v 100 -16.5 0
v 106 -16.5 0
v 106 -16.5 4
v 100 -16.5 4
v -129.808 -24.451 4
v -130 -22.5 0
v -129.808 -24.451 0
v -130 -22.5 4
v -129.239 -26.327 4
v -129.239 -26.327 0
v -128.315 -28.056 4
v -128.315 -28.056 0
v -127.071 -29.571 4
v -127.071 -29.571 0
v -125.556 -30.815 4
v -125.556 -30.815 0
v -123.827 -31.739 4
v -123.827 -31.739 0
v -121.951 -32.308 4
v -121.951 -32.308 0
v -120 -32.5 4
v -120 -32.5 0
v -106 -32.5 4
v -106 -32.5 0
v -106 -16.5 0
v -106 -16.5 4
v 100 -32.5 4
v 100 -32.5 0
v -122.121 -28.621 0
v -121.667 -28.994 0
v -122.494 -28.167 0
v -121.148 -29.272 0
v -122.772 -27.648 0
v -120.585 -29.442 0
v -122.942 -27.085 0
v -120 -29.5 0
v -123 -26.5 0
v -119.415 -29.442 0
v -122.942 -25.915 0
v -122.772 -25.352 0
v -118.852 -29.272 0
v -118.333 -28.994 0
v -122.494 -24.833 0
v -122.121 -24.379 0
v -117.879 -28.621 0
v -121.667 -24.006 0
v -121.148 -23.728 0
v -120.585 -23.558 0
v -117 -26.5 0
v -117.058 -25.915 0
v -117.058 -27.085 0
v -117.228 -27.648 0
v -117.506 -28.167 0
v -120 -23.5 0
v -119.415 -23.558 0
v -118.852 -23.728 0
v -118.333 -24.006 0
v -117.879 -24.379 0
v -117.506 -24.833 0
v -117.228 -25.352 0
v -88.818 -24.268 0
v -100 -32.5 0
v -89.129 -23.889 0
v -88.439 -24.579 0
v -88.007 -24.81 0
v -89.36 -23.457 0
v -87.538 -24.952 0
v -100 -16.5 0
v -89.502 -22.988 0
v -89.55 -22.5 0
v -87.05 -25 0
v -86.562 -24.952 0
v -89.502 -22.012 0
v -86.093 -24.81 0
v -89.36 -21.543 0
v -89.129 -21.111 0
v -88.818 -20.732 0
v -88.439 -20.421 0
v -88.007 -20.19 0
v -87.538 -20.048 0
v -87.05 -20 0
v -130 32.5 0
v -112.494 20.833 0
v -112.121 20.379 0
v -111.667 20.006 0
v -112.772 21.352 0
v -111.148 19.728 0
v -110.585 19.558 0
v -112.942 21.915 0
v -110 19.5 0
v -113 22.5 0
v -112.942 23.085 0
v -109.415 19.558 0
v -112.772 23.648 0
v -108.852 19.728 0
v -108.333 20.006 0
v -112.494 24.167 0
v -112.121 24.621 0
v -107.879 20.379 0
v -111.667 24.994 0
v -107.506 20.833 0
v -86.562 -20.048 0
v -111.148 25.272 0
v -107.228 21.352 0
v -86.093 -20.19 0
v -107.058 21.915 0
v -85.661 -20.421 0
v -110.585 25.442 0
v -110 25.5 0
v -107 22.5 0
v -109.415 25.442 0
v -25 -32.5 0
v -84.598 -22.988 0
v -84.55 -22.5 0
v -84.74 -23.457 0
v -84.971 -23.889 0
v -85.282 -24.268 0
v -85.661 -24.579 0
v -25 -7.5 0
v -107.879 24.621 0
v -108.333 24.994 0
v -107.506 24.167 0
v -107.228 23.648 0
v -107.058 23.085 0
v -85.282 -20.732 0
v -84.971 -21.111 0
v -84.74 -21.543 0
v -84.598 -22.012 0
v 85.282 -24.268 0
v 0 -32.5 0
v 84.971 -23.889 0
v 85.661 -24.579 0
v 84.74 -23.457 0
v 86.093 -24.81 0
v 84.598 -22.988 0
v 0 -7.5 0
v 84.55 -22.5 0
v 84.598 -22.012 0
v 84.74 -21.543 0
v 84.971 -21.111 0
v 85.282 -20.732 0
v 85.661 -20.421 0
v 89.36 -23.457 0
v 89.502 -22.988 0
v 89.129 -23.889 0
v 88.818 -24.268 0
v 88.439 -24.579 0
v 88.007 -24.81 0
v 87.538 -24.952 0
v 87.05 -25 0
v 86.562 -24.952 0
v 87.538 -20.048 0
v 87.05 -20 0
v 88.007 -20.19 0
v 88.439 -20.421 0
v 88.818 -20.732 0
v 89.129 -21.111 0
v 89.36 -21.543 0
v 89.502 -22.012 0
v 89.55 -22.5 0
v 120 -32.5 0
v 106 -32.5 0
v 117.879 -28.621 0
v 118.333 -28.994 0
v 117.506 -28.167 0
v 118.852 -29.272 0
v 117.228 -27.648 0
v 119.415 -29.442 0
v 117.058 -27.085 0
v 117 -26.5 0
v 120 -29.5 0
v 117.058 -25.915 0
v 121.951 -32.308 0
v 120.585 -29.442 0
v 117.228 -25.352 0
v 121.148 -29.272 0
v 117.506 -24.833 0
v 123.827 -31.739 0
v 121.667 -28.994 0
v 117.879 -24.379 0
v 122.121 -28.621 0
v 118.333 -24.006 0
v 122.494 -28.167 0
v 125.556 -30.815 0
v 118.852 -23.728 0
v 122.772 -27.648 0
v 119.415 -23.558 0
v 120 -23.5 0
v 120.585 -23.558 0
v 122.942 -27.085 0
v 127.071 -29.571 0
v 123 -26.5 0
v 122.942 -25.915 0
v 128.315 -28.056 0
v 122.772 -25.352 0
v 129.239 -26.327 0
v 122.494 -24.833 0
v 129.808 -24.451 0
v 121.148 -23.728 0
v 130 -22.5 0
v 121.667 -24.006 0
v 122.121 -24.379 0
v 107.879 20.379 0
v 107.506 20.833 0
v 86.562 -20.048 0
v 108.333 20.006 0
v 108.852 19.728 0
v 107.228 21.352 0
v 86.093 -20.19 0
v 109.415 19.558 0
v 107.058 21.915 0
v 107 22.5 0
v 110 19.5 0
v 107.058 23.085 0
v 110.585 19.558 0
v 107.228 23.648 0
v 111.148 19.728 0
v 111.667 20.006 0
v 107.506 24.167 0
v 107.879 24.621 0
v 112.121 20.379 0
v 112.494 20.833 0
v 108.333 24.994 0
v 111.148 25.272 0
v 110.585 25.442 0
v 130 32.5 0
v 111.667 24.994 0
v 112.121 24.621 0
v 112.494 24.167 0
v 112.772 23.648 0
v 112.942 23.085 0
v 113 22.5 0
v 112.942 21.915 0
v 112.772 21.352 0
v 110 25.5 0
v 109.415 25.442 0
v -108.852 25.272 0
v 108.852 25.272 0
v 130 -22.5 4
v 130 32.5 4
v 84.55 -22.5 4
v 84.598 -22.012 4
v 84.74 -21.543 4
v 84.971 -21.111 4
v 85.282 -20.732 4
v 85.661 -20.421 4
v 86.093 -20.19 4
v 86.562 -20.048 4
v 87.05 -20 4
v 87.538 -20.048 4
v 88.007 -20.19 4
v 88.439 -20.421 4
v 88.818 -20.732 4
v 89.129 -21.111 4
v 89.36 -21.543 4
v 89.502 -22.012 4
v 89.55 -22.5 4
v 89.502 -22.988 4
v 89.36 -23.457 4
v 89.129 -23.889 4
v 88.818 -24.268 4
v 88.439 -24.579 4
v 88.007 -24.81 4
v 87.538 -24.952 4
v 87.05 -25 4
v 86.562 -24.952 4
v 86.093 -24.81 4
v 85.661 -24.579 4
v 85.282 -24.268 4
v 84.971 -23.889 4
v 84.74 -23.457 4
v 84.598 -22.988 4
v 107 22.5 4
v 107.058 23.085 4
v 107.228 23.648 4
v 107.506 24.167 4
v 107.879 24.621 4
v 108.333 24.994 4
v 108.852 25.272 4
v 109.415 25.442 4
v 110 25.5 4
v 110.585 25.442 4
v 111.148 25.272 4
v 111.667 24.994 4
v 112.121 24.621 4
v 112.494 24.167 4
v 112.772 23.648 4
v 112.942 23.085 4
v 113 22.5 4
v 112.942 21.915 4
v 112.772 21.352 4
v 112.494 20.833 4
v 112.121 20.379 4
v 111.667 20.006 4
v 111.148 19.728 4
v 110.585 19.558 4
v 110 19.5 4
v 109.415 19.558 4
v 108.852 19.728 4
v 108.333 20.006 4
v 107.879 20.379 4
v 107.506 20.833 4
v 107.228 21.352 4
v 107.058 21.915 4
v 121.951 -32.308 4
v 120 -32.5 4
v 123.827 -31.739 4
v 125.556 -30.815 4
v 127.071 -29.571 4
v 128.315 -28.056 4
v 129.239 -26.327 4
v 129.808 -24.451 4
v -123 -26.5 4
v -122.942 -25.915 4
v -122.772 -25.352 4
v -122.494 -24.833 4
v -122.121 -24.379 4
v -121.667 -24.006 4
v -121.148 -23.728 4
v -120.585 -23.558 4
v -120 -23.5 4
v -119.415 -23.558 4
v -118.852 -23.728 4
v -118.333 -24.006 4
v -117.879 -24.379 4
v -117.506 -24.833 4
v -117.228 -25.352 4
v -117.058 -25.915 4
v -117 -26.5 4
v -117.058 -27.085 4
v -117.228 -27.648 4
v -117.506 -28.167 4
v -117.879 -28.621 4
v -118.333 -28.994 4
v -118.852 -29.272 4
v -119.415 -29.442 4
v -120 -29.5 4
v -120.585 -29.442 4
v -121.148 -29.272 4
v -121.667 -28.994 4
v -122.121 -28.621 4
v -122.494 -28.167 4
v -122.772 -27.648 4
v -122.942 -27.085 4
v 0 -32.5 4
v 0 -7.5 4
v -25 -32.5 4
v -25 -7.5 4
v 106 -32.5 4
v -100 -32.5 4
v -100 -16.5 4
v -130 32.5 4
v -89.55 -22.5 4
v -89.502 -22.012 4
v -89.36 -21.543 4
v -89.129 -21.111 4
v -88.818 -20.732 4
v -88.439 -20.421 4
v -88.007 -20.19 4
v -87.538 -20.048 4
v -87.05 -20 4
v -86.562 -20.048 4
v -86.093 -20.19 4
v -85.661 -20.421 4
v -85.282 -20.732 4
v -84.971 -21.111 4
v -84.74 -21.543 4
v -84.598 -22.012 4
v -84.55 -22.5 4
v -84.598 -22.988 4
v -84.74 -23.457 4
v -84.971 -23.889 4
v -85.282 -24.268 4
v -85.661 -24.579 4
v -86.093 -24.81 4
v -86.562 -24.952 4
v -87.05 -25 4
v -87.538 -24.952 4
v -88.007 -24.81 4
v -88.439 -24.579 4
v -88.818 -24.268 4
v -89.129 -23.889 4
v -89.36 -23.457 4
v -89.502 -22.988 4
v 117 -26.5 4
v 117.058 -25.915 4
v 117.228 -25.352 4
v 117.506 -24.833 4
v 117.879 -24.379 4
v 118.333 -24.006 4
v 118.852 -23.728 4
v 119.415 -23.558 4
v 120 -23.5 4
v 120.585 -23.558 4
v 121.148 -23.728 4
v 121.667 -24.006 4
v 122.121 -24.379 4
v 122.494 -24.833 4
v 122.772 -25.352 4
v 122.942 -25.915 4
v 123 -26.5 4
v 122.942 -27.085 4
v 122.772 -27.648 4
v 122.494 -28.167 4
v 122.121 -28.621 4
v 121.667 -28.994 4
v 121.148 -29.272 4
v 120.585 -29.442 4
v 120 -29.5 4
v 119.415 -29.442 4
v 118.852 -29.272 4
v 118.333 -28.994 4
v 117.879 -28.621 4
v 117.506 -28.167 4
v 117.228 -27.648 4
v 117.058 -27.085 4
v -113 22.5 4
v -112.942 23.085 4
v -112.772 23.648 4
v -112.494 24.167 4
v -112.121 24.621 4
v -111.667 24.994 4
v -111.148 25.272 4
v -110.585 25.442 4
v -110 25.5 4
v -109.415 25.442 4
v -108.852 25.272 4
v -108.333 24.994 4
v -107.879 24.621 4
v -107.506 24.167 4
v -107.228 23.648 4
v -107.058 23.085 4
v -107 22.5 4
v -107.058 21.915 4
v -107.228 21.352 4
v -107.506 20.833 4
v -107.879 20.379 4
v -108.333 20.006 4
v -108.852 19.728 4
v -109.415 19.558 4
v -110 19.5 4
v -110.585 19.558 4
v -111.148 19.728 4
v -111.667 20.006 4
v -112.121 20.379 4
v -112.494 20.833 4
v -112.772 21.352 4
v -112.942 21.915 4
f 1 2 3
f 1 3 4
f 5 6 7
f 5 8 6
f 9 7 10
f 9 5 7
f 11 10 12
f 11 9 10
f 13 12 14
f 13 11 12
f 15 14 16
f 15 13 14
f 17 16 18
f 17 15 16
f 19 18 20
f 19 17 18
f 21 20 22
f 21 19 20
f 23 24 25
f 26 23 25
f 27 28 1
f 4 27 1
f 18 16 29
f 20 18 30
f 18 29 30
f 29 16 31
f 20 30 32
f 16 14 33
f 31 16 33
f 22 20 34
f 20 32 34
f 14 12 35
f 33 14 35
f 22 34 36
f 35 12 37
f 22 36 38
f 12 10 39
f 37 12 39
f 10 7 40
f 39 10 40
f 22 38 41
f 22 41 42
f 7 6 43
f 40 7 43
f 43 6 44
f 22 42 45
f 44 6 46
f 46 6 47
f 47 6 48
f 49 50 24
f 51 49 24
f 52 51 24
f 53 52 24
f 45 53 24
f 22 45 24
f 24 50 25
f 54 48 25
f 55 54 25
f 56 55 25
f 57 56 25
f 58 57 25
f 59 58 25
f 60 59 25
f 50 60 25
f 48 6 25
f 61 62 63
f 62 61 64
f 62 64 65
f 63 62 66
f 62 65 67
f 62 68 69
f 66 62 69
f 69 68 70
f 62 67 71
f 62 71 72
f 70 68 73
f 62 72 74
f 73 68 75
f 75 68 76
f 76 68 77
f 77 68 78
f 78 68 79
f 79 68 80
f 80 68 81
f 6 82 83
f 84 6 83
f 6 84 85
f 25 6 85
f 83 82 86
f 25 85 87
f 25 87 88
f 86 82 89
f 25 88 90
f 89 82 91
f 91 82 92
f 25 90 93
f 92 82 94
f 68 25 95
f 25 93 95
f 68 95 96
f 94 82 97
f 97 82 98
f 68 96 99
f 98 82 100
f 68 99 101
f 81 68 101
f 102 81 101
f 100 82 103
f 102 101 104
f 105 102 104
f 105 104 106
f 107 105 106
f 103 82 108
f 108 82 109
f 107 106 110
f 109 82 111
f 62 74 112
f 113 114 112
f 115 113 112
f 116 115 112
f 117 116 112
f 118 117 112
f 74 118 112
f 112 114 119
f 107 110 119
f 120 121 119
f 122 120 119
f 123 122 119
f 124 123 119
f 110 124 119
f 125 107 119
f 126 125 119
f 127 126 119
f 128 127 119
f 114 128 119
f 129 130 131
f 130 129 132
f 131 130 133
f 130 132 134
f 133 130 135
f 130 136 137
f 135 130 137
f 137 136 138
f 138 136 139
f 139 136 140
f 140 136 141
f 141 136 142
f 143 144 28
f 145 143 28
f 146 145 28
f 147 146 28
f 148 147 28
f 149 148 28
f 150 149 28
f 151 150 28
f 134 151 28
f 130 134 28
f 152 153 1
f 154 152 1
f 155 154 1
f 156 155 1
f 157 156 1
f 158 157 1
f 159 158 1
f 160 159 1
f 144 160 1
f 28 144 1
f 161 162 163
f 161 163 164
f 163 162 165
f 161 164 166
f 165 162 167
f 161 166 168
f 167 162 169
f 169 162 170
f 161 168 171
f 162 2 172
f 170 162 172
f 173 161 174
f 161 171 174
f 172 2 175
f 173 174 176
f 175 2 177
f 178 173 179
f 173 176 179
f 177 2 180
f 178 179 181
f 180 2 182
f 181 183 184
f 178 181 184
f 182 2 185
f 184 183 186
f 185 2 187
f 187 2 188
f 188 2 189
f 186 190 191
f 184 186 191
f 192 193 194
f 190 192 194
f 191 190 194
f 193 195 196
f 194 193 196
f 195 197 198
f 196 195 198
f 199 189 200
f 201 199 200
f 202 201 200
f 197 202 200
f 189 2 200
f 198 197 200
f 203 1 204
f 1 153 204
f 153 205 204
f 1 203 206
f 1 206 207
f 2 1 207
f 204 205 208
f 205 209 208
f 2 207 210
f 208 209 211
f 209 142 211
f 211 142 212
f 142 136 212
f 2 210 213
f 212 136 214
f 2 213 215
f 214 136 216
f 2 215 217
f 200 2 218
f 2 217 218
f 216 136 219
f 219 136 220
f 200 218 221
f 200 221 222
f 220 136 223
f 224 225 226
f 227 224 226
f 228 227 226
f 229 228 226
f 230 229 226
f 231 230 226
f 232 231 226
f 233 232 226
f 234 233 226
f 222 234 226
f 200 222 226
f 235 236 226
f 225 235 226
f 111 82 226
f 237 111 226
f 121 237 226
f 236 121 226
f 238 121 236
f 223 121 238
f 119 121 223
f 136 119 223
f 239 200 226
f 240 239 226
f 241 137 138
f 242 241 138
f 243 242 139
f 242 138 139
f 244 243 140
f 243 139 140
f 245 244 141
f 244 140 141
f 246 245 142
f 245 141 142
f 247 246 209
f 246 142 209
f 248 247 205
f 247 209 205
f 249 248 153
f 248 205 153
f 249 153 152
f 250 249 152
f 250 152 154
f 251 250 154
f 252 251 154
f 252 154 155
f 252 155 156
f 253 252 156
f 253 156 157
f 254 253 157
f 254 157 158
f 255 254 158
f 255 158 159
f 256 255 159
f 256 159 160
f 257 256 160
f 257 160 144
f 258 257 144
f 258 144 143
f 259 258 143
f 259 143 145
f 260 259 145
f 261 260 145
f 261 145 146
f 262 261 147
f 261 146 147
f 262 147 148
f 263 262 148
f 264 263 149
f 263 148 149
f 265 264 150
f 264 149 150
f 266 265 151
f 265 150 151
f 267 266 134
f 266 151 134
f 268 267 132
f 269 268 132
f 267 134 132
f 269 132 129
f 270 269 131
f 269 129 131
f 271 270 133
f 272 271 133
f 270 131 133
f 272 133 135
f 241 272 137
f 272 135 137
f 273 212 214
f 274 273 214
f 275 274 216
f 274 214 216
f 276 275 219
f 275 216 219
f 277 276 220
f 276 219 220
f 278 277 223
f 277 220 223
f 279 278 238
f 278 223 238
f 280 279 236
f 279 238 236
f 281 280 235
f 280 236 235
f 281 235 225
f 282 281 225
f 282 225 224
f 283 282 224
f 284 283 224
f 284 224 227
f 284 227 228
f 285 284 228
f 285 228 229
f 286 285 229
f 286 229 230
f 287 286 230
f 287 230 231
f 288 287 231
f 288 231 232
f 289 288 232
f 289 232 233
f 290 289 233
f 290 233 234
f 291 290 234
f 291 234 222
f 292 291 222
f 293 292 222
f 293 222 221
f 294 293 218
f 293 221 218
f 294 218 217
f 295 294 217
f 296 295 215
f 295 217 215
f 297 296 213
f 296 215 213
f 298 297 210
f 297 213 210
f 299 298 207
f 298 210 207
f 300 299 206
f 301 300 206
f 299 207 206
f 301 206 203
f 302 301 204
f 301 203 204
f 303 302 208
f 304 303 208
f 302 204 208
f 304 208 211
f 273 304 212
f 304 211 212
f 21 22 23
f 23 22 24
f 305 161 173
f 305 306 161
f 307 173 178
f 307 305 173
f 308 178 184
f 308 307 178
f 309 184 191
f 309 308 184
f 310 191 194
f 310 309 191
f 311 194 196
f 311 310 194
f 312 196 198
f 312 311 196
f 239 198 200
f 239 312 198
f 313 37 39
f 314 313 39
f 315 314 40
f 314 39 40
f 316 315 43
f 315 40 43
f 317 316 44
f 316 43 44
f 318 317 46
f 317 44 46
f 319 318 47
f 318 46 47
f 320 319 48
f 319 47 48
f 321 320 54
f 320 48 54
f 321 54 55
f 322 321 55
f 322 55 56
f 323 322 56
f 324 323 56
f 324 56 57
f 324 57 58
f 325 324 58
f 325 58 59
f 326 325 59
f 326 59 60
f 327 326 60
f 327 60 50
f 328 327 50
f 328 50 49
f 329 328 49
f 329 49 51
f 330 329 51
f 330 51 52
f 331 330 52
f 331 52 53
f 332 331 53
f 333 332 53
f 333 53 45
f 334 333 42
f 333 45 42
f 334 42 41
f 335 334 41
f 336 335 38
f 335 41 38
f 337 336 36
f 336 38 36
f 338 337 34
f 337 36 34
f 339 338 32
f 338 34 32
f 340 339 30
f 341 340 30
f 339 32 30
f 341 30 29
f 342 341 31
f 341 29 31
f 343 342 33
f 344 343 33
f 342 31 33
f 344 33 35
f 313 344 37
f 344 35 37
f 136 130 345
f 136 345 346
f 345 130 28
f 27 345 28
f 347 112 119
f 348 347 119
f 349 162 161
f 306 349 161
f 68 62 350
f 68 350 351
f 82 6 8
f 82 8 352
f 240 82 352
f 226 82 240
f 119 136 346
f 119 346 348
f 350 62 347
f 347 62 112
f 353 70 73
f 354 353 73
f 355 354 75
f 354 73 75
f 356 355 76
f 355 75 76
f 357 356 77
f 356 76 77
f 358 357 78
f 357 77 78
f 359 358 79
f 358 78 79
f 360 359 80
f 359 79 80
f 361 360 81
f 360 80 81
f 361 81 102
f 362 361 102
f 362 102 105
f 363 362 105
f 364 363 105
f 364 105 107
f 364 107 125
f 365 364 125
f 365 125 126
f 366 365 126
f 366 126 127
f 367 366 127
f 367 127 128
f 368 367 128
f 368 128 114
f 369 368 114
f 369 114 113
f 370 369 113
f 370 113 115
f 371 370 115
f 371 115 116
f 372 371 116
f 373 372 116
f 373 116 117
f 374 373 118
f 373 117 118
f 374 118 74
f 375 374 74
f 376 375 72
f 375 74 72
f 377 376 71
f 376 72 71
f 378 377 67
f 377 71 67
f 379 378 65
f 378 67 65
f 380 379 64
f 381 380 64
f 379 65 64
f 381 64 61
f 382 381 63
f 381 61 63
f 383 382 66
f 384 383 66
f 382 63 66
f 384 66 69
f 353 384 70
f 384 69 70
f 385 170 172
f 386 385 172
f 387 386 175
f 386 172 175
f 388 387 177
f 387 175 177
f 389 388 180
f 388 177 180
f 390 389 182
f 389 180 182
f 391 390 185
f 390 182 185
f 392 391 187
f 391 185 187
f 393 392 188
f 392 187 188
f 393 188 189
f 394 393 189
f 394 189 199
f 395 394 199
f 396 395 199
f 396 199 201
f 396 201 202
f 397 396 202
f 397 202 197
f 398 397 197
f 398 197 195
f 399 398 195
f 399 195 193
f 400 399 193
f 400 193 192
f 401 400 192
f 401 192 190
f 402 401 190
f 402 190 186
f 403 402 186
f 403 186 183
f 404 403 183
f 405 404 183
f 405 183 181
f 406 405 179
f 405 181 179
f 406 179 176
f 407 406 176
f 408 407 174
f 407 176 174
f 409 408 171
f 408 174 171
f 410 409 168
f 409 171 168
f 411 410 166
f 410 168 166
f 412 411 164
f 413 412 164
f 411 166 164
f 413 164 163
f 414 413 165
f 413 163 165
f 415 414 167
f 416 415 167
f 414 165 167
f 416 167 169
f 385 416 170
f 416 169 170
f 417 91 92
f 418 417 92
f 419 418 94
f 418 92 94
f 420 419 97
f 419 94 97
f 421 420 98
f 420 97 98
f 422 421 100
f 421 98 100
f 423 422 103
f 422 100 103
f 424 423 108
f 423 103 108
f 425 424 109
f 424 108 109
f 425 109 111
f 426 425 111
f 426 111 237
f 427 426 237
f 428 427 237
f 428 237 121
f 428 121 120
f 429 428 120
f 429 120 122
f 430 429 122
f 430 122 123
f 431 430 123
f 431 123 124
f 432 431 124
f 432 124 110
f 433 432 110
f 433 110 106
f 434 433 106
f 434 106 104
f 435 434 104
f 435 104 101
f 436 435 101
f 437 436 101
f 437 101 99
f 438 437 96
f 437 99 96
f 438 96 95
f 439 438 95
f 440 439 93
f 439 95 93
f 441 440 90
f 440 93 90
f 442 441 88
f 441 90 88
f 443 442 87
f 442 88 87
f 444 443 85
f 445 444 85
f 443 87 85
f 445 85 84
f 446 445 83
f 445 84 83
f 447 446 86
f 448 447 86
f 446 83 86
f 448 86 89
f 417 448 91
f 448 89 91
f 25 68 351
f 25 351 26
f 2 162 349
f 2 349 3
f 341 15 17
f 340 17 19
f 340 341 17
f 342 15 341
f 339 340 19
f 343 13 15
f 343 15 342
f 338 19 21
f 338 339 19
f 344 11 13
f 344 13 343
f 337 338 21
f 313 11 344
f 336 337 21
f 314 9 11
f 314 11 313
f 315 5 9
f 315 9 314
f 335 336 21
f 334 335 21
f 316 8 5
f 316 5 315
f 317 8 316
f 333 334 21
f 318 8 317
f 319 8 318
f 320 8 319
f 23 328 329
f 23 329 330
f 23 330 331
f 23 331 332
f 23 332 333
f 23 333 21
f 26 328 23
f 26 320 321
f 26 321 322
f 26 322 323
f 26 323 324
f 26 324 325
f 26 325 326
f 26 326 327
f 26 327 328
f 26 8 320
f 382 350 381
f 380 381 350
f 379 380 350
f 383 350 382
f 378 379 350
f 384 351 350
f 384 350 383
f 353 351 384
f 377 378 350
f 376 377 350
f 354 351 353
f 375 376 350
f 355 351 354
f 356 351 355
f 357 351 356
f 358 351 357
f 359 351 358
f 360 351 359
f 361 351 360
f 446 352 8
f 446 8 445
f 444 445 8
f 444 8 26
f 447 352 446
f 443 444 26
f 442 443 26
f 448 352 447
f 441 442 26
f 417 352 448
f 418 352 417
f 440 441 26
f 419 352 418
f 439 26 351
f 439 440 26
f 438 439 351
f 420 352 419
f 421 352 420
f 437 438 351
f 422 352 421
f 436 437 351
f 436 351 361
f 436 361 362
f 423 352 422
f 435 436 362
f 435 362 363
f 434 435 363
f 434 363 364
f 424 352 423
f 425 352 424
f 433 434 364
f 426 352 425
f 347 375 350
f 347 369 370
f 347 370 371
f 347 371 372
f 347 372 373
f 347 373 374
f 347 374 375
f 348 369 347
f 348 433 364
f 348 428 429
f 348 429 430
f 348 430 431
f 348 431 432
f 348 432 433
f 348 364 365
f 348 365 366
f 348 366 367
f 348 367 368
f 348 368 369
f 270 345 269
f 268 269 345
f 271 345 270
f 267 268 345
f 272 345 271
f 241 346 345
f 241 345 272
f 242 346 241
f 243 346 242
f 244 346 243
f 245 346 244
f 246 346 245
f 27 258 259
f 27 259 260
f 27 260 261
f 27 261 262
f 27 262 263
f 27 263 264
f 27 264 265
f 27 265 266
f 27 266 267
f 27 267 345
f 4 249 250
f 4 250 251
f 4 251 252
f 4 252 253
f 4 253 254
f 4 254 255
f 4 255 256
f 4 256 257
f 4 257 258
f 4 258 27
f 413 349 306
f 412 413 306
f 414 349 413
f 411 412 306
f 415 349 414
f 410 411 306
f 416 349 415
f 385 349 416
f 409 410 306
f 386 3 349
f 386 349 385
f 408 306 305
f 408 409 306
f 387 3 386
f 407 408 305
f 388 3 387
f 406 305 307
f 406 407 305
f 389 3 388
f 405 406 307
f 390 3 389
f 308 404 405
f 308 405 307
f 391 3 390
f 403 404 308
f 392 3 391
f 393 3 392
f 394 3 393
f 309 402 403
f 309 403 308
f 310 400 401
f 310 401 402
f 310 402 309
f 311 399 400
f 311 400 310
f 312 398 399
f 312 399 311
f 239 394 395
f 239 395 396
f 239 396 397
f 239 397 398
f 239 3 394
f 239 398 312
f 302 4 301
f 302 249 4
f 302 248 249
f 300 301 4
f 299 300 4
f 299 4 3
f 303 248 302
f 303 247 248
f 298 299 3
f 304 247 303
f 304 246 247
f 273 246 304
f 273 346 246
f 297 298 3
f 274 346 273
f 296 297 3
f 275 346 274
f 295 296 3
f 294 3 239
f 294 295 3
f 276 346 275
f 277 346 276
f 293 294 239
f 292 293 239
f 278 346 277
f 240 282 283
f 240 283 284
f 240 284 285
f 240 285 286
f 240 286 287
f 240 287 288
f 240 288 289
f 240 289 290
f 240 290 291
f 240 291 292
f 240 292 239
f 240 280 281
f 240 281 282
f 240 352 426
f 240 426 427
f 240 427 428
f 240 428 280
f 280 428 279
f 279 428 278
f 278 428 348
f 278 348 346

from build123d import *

# Parameters (mm, degrees)
SKETCH1_W           = 260
SKETCH1_H           = 65
BOSS_EXTRUDE2_DEPTH = 4
SKETCH3_R           = 3
CUT_EXTRUDE2_DEPTH  = 135.060620616
FILLET1_R           = 10
SKETCH4_W           = 25
SKETCH4_H           = 25
CUT_EXTRUDE3_DEPTH  = 10
SKETCH5_W           = 6
SKETCH5_H           = 16
CUT_EXTRUDE4_DEPTH  = 135.060620616
SKETCH6_R           = 2.5
CUT_EXTRUDE5_DEPTH  = 135.060620616


with BuildPart() as part:
    # Sketch1 → Boss-Extrude2 (new body)
    with BuildSketch(Plane.XY):
        Rectangle(SKETCH1_W, SKETCH1_H)
    extrude(amount=BOSS_EXTRUDE2_DEPTH)

    # Sketch3 → Cut-Extrude2 (cut, through all)
    with BuildSketch(Plane(origin=(0, 0, 0), x_dir=(-1, 0, 0), z_dir=(0, 0, -1))):
        with Locations((120, -26.5)):
            Circle(SKETCH3_R)
        with Locations((-120, -26.5)):
            Circle(SKETCH3_R)
        with Locations((-110, 22.5)):
            Circle(SKETCH3_R)
        with Locations((110, 22.5)):
            Circle(SKETCH3_R)
    extrude(amount=-CUT_EXTRUDE2_DEPTH, mode=Mode.SUBTRACT)

    # Fillet1
    fillet1_edges = [part.edges().sort_by_distance(p)[0] for p in [
        (130, -32.5, 2),
        (-130, -32.5, 2),
    ]]
    fillet(fillet1_edges, radius=FILLET1_R)

    # Sketch4 → Cut-Extrude3 (cut)
    with BuildSketch(Plane(origin=(0, 0, 0), x_dir=(-1, 0, 0), z_dir=(0, 0, -1))):
        with Locations((12.5, -20)):
            Rectangle(SKETCH4_W, SKETCH4_H)
    extrude(amount=-CUT_EXTRUDE3_DEPTH, mode=Mode.SUBTRACT)

    # Sketch5 → Cut-Extrude4 (cut, through all)
    with BuildSketch(Plane(origin=(0, 0, 0), x_dir=(-1, 0, 0), z_dir=(0, 0, -1))):
        with Locations((-103, -24.5)):
            Rectangle(SKETCH5_W, SKETCH5_H)
        with Locations((103, -24.5)):
            Rectangle(SKETCH5_W, SKETCH5_H)
    extrude(amount=-CUT_EXTRUDE4_DEPTH, mode=Mode.SUBTRACT)

    # Sketch6 → Cut-Extrude5 (cut, through all)
    with BuildSketch(Plane(origin=(0, 0, 0), x_dir=(-1, 0, 0), z_dir=(0, 0, -1))):
        with Locations((87.05, -22.5)):
            Circle(SKETCH6_R)
        with Locations((-87.05, -22.5)):
            Circle(SKETCH6_R)
    extrude(amount=-CUT_EXTRUDE5_DEPTH, mode=Mode.SUBTRACT)


solid = part.part
